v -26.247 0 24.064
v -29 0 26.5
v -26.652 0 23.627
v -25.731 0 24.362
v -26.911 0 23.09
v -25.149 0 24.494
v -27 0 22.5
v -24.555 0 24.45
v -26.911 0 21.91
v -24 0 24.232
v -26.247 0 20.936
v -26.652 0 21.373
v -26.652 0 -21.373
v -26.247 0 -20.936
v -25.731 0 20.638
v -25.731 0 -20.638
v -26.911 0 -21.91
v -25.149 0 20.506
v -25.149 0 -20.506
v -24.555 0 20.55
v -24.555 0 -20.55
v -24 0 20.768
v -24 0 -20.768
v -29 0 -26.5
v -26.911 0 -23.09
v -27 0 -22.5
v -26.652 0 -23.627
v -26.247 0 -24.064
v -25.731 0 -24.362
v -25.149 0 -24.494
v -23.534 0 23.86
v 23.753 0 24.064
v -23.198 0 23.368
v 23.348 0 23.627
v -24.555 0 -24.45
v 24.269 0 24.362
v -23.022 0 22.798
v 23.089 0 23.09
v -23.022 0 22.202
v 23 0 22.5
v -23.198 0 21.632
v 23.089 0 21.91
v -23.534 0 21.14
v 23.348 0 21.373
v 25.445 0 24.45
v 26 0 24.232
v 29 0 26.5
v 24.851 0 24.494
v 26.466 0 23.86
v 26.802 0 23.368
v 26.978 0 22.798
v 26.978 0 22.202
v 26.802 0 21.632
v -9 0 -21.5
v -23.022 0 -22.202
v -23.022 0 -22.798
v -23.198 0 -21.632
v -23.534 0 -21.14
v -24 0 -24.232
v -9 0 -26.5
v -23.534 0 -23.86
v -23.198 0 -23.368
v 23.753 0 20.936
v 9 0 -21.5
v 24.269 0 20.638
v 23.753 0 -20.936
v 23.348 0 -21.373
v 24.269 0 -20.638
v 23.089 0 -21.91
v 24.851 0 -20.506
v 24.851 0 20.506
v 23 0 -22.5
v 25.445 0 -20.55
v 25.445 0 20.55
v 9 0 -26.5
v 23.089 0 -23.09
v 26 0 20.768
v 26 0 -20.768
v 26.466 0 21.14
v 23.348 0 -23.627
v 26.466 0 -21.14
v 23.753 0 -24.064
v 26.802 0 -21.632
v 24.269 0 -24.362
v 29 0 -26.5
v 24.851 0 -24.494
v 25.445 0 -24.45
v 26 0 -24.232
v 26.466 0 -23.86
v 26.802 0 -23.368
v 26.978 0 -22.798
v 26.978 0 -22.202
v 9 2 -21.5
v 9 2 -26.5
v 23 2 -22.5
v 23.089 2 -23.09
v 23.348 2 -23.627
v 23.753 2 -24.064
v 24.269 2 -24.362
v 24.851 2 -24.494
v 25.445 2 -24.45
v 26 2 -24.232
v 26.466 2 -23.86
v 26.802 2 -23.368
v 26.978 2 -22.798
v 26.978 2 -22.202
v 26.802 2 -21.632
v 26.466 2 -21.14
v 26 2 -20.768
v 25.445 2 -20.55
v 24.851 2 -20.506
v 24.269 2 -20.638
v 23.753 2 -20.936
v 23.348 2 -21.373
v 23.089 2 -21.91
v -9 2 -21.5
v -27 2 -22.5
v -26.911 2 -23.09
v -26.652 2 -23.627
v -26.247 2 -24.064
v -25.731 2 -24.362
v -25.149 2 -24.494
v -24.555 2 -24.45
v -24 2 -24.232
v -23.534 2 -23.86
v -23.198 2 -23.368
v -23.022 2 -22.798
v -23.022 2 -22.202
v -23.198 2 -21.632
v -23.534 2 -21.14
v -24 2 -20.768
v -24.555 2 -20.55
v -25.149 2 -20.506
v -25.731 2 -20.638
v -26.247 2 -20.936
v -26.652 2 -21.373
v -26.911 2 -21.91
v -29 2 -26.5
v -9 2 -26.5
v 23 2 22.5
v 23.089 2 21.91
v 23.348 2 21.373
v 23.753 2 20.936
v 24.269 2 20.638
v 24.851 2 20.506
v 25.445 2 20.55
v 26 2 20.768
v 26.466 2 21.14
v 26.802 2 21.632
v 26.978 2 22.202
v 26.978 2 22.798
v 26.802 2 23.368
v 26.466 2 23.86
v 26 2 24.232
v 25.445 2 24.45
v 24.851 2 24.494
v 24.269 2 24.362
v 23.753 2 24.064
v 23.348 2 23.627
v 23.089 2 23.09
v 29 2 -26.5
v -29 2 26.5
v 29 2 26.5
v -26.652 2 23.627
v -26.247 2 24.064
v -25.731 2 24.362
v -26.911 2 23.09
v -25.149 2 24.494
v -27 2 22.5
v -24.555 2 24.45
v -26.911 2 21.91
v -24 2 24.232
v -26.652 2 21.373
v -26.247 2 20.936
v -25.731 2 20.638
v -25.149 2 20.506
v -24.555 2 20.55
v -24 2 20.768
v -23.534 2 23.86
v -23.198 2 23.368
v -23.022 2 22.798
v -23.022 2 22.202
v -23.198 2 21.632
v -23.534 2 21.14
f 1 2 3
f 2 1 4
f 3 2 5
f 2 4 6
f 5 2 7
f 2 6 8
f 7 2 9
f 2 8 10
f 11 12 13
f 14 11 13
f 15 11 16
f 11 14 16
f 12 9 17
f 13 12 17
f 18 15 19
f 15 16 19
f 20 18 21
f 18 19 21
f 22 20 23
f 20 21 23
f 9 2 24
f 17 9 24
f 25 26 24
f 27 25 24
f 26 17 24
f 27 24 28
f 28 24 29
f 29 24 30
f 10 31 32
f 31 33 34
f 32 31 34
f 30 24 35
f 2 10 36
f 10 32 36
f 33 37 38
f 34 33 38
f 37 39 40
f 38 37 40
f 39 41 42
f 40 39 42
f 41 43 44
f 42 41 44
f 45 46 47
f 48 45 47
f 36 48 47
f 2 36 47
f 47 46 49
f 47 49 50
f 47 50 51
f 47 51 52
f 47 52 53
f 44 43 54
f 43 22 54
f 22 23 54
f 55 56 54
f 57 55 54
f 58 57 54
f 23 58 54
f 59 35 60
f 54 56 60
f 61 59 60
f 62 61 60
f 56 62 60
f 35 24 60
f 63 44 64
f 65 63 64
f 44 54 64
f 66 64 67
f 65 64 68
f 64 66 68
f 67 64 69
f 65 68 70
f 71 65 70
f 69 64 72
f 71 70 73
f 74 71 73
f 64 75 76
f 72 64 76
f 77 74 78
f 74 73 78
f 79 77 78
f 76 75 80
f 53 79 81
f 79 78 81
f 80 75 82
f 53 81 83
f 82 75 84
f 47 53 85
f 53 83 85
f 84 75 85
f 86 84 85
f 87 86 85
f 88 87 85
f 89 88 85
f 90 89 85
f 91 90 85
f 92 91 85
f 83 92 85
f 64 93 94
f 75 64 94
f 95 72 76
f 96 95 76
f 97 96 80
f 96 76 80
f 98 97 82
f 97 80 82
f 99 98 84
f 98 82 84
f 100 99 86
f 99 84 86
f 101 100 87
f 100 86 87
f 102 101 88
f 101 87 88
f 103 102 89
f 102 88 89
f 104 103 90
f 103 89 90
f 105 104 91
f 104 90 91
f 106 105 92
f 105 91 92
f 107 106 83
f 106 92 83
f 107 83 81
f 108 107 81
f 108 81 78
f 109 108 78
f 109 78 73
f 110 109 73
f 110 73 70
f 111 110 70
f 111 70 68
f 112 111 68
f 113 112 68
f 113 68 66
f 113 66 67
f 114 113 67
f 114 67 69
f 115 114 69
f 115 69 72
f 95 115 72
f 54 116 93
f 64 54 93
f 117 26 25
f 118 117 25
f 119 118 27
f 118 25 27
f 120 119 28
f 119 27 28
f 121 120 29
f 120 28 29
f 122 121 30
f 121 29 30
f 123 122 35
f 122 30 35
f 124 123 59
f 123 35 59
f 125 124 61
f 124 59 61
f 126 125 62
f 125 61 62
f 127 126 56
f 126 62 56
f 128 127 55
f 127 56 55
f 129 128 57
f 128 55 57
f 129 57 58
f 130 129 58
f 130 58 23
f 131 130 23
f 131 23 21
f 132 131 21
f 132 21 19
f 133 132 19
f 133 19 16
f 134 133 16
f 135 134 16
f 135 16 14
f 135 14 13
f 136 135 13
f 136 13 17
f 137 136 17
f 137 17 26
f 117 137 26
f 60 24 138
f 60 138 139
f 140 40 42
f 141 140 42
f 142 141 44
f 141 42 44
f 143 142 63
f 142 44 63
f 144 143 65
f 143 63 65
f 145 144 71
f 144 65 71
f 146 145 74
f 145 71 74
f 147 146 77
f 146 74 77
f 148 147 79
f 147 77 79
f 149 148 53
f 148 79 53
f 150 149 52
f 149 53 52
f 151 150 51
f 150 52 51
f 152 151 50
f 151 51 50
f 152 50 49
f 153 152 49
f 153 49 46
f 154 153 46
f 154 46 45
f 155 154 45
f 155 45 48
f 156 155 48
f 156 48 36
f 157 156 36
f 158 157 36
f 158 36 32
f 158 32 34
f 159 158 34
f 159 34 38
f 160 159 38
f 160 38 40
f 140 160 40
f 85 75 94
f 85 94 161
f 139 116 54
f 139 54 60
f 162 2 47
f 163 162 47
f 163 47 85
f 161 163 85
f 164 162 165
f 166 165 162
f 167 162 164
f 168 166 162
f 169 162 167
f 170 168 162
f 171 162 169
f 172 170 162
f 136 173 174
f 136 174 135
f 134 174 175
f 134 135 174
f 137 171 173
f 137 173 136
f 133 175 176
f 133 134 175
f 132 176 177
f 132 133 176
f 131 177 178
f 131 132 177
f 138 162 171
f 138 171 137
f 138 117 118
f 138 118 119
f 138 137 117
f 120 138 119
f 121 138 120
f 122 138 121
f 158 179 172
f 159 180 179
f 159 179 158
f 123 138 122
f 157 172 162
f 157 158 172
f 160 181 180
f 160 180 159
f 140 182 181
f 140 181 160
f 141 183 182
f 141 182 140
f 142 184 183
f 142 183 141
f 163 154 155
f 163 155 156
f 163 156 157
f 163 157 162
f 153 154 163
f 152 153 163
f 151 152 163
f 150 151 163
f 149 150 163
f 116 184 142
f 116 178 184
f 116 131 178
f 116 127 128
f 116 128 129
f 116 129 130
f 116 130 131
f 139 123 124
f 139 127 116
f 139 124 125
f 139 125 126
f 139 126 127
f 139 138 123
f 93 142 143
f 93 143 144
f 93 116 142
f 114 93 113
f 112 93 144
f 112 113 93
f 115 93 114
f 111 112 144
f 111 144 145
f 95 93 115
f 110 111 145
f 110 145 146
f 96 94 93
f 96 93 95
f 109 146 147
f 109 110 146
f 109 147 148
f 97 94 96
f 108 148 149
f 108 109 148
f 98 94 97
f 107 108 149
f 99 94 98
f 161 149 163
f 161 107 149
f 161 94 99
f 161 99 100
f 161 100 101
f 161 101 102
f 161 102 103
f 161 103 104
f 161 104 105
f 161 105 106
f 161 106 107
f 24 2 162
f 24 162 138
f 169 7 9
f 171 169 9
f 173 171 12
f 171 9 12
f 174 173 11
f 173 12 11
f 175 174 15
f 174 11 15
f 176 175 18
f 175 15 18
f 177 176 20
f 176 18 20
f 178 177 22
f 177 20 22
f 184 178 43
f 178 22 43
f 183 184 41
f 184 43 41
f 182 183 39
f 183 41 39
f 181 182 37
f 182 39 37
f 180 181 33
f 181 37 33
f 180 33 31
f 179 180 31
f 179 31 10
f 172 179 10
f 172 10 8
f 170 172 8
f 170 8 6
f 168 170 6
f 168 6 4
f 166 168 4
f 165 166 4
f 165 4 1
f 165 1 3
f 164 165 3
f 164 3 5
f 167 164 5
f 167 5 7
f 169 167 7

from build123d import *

# Parameters (mm, degrees)
SKETCH1_W                 = 58
SKETCH1_H                 = 53
BOSS_EXTRUDE1_DEPTH       = 2
F_4_0MM_DOWEL_HOLE1_D     = 4
F_4_0MM_DOWEL_HOLE1_DEPTH = 2
SKETCH4_W                 = 18
SKETCH4_H                 = 5
CUT_EXTRUDE1_DEPTH        = 2


with BuildPart() as part:
    # Sketch1 → Boss-Extrude1 (new body)
    with BuildSketch(Plane(origin=(0, 0, 0), x_dir=(1, 0, 0), z_dir=(0, 1, 0))):
        Rectangle(SKETCH1_W, SKETCH1_H)
    extrude(amount=BOSS_EXTRUDE1_DEPTH)

    # Ø4.0mm Dowel Hole1
    with Locations(Plane(origin=(0, 2, 0), x_dir=(1, 0, 0), z_dir=(0, 1, 0))):
        with Locations((25, 22.5), (-25, 22.5), (-25, -22.5), (25, -22.5)):
            Hole(F_4_0MM_DOWEL_HOLE1_D / 2, depth=F_4_0MM_DOWEL_HOLE1_DEPTH)

    # Sketch4 → Cut-Extrude1 (cut)
    with BuildSketch(Plane(origin=(0, 2, 0), x_dir=(1, 0, 0), z_dir=(0, 1, 0))):
        with Locations((0, 24)):
            Rectangle(SKETCH4_W, SKETCH4_H)
    extrude(amount=-CUT_EXTRUDE1_DEPTH, mode=Mode.SUBTRACT)


solid = part.part
